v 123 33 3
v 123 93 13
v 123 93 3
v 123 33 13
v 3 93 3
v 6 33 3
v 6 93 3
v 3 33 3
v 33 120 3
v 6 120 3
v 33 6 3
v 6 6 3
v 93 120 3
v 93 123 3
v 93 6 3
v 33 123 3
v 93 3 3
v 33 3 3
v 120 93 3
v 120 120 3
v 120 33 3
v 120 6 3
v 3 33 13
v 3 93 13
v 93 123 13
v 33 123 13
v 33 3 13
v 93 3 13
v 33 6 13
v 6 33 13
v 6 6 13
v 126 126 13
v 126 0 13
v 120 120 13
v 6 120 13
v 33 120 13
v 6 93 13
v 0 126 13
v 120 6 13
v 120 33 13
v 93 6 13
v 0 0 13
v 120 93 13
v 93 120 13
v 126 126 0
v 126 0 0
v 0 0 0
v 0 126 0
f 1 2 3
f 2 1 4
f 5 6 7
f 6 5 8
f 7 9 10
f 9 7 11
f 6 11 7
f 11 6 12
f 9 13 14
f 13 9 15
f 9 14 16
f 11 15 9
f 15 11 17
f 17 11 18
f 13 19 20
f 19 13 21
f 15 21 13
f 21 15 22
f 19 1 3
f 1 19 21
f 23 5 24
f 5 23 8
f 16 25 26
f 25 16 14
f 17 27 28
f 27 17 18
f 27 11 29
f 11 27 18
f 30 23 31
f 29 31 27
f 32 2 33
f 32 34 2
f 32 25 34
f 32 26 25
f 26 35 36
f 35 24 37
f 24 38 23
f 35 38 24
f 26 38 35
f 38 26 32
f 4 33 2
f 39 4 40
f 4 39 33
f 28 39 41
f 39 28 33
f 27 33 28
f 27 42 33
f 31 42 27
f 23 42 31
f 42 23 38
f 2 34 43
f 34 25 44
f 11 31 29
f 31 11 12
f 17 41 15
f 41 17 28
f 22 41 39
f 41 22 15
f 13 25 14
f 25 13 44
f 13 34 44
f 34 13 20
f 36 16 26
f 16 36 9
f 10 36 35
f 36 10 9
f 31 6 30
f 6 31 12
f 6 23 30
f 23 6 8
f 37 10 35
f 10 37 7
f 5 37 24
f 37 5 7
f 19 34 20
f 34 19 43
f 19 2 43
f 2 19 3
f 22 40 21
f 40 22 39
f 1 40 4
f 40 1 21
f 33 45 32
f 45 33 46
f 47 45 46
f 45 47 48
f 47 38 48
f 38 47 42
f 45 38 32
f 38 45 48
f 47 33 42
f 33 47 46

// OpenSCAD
eps=1/128;
$fn=100;

size = 120;
thickness = 10;
interface = 3;
interface_length = 30;
wall = 3;

difference() {
    cube([size+wall+wall, size+wall+wall, thickness+wall]);
    difference() {
        translate([wall, wall, wall]) cube([size, size, thickness+eps]);
        
        translate([wall, wall, wall]) cube([interface_length, interface, thickness]);
        translate([size-interface_length+wall, wall, wall]) cube([interface_length, interface, thickness]);
        translate([size-interface_length+wall, size, wall]) cube([interface_length, interface, thickness]);
        translate([wall, size, wall]) cube([interface_length, interface, thickness]);
        
        translate([wall, wall, wall]) cube([interface, interface_length, thickness]);
        translate([wall, size-interface_length+wall, wall]) cube([interface, interface_length, thickness]);
        translate([size, size-interface_length+wall, wall]) cube([interface, interface_length, thickness]);
        translate([size, wall, wall]) cube([interface, interface_length, thickness]);
    }
}
